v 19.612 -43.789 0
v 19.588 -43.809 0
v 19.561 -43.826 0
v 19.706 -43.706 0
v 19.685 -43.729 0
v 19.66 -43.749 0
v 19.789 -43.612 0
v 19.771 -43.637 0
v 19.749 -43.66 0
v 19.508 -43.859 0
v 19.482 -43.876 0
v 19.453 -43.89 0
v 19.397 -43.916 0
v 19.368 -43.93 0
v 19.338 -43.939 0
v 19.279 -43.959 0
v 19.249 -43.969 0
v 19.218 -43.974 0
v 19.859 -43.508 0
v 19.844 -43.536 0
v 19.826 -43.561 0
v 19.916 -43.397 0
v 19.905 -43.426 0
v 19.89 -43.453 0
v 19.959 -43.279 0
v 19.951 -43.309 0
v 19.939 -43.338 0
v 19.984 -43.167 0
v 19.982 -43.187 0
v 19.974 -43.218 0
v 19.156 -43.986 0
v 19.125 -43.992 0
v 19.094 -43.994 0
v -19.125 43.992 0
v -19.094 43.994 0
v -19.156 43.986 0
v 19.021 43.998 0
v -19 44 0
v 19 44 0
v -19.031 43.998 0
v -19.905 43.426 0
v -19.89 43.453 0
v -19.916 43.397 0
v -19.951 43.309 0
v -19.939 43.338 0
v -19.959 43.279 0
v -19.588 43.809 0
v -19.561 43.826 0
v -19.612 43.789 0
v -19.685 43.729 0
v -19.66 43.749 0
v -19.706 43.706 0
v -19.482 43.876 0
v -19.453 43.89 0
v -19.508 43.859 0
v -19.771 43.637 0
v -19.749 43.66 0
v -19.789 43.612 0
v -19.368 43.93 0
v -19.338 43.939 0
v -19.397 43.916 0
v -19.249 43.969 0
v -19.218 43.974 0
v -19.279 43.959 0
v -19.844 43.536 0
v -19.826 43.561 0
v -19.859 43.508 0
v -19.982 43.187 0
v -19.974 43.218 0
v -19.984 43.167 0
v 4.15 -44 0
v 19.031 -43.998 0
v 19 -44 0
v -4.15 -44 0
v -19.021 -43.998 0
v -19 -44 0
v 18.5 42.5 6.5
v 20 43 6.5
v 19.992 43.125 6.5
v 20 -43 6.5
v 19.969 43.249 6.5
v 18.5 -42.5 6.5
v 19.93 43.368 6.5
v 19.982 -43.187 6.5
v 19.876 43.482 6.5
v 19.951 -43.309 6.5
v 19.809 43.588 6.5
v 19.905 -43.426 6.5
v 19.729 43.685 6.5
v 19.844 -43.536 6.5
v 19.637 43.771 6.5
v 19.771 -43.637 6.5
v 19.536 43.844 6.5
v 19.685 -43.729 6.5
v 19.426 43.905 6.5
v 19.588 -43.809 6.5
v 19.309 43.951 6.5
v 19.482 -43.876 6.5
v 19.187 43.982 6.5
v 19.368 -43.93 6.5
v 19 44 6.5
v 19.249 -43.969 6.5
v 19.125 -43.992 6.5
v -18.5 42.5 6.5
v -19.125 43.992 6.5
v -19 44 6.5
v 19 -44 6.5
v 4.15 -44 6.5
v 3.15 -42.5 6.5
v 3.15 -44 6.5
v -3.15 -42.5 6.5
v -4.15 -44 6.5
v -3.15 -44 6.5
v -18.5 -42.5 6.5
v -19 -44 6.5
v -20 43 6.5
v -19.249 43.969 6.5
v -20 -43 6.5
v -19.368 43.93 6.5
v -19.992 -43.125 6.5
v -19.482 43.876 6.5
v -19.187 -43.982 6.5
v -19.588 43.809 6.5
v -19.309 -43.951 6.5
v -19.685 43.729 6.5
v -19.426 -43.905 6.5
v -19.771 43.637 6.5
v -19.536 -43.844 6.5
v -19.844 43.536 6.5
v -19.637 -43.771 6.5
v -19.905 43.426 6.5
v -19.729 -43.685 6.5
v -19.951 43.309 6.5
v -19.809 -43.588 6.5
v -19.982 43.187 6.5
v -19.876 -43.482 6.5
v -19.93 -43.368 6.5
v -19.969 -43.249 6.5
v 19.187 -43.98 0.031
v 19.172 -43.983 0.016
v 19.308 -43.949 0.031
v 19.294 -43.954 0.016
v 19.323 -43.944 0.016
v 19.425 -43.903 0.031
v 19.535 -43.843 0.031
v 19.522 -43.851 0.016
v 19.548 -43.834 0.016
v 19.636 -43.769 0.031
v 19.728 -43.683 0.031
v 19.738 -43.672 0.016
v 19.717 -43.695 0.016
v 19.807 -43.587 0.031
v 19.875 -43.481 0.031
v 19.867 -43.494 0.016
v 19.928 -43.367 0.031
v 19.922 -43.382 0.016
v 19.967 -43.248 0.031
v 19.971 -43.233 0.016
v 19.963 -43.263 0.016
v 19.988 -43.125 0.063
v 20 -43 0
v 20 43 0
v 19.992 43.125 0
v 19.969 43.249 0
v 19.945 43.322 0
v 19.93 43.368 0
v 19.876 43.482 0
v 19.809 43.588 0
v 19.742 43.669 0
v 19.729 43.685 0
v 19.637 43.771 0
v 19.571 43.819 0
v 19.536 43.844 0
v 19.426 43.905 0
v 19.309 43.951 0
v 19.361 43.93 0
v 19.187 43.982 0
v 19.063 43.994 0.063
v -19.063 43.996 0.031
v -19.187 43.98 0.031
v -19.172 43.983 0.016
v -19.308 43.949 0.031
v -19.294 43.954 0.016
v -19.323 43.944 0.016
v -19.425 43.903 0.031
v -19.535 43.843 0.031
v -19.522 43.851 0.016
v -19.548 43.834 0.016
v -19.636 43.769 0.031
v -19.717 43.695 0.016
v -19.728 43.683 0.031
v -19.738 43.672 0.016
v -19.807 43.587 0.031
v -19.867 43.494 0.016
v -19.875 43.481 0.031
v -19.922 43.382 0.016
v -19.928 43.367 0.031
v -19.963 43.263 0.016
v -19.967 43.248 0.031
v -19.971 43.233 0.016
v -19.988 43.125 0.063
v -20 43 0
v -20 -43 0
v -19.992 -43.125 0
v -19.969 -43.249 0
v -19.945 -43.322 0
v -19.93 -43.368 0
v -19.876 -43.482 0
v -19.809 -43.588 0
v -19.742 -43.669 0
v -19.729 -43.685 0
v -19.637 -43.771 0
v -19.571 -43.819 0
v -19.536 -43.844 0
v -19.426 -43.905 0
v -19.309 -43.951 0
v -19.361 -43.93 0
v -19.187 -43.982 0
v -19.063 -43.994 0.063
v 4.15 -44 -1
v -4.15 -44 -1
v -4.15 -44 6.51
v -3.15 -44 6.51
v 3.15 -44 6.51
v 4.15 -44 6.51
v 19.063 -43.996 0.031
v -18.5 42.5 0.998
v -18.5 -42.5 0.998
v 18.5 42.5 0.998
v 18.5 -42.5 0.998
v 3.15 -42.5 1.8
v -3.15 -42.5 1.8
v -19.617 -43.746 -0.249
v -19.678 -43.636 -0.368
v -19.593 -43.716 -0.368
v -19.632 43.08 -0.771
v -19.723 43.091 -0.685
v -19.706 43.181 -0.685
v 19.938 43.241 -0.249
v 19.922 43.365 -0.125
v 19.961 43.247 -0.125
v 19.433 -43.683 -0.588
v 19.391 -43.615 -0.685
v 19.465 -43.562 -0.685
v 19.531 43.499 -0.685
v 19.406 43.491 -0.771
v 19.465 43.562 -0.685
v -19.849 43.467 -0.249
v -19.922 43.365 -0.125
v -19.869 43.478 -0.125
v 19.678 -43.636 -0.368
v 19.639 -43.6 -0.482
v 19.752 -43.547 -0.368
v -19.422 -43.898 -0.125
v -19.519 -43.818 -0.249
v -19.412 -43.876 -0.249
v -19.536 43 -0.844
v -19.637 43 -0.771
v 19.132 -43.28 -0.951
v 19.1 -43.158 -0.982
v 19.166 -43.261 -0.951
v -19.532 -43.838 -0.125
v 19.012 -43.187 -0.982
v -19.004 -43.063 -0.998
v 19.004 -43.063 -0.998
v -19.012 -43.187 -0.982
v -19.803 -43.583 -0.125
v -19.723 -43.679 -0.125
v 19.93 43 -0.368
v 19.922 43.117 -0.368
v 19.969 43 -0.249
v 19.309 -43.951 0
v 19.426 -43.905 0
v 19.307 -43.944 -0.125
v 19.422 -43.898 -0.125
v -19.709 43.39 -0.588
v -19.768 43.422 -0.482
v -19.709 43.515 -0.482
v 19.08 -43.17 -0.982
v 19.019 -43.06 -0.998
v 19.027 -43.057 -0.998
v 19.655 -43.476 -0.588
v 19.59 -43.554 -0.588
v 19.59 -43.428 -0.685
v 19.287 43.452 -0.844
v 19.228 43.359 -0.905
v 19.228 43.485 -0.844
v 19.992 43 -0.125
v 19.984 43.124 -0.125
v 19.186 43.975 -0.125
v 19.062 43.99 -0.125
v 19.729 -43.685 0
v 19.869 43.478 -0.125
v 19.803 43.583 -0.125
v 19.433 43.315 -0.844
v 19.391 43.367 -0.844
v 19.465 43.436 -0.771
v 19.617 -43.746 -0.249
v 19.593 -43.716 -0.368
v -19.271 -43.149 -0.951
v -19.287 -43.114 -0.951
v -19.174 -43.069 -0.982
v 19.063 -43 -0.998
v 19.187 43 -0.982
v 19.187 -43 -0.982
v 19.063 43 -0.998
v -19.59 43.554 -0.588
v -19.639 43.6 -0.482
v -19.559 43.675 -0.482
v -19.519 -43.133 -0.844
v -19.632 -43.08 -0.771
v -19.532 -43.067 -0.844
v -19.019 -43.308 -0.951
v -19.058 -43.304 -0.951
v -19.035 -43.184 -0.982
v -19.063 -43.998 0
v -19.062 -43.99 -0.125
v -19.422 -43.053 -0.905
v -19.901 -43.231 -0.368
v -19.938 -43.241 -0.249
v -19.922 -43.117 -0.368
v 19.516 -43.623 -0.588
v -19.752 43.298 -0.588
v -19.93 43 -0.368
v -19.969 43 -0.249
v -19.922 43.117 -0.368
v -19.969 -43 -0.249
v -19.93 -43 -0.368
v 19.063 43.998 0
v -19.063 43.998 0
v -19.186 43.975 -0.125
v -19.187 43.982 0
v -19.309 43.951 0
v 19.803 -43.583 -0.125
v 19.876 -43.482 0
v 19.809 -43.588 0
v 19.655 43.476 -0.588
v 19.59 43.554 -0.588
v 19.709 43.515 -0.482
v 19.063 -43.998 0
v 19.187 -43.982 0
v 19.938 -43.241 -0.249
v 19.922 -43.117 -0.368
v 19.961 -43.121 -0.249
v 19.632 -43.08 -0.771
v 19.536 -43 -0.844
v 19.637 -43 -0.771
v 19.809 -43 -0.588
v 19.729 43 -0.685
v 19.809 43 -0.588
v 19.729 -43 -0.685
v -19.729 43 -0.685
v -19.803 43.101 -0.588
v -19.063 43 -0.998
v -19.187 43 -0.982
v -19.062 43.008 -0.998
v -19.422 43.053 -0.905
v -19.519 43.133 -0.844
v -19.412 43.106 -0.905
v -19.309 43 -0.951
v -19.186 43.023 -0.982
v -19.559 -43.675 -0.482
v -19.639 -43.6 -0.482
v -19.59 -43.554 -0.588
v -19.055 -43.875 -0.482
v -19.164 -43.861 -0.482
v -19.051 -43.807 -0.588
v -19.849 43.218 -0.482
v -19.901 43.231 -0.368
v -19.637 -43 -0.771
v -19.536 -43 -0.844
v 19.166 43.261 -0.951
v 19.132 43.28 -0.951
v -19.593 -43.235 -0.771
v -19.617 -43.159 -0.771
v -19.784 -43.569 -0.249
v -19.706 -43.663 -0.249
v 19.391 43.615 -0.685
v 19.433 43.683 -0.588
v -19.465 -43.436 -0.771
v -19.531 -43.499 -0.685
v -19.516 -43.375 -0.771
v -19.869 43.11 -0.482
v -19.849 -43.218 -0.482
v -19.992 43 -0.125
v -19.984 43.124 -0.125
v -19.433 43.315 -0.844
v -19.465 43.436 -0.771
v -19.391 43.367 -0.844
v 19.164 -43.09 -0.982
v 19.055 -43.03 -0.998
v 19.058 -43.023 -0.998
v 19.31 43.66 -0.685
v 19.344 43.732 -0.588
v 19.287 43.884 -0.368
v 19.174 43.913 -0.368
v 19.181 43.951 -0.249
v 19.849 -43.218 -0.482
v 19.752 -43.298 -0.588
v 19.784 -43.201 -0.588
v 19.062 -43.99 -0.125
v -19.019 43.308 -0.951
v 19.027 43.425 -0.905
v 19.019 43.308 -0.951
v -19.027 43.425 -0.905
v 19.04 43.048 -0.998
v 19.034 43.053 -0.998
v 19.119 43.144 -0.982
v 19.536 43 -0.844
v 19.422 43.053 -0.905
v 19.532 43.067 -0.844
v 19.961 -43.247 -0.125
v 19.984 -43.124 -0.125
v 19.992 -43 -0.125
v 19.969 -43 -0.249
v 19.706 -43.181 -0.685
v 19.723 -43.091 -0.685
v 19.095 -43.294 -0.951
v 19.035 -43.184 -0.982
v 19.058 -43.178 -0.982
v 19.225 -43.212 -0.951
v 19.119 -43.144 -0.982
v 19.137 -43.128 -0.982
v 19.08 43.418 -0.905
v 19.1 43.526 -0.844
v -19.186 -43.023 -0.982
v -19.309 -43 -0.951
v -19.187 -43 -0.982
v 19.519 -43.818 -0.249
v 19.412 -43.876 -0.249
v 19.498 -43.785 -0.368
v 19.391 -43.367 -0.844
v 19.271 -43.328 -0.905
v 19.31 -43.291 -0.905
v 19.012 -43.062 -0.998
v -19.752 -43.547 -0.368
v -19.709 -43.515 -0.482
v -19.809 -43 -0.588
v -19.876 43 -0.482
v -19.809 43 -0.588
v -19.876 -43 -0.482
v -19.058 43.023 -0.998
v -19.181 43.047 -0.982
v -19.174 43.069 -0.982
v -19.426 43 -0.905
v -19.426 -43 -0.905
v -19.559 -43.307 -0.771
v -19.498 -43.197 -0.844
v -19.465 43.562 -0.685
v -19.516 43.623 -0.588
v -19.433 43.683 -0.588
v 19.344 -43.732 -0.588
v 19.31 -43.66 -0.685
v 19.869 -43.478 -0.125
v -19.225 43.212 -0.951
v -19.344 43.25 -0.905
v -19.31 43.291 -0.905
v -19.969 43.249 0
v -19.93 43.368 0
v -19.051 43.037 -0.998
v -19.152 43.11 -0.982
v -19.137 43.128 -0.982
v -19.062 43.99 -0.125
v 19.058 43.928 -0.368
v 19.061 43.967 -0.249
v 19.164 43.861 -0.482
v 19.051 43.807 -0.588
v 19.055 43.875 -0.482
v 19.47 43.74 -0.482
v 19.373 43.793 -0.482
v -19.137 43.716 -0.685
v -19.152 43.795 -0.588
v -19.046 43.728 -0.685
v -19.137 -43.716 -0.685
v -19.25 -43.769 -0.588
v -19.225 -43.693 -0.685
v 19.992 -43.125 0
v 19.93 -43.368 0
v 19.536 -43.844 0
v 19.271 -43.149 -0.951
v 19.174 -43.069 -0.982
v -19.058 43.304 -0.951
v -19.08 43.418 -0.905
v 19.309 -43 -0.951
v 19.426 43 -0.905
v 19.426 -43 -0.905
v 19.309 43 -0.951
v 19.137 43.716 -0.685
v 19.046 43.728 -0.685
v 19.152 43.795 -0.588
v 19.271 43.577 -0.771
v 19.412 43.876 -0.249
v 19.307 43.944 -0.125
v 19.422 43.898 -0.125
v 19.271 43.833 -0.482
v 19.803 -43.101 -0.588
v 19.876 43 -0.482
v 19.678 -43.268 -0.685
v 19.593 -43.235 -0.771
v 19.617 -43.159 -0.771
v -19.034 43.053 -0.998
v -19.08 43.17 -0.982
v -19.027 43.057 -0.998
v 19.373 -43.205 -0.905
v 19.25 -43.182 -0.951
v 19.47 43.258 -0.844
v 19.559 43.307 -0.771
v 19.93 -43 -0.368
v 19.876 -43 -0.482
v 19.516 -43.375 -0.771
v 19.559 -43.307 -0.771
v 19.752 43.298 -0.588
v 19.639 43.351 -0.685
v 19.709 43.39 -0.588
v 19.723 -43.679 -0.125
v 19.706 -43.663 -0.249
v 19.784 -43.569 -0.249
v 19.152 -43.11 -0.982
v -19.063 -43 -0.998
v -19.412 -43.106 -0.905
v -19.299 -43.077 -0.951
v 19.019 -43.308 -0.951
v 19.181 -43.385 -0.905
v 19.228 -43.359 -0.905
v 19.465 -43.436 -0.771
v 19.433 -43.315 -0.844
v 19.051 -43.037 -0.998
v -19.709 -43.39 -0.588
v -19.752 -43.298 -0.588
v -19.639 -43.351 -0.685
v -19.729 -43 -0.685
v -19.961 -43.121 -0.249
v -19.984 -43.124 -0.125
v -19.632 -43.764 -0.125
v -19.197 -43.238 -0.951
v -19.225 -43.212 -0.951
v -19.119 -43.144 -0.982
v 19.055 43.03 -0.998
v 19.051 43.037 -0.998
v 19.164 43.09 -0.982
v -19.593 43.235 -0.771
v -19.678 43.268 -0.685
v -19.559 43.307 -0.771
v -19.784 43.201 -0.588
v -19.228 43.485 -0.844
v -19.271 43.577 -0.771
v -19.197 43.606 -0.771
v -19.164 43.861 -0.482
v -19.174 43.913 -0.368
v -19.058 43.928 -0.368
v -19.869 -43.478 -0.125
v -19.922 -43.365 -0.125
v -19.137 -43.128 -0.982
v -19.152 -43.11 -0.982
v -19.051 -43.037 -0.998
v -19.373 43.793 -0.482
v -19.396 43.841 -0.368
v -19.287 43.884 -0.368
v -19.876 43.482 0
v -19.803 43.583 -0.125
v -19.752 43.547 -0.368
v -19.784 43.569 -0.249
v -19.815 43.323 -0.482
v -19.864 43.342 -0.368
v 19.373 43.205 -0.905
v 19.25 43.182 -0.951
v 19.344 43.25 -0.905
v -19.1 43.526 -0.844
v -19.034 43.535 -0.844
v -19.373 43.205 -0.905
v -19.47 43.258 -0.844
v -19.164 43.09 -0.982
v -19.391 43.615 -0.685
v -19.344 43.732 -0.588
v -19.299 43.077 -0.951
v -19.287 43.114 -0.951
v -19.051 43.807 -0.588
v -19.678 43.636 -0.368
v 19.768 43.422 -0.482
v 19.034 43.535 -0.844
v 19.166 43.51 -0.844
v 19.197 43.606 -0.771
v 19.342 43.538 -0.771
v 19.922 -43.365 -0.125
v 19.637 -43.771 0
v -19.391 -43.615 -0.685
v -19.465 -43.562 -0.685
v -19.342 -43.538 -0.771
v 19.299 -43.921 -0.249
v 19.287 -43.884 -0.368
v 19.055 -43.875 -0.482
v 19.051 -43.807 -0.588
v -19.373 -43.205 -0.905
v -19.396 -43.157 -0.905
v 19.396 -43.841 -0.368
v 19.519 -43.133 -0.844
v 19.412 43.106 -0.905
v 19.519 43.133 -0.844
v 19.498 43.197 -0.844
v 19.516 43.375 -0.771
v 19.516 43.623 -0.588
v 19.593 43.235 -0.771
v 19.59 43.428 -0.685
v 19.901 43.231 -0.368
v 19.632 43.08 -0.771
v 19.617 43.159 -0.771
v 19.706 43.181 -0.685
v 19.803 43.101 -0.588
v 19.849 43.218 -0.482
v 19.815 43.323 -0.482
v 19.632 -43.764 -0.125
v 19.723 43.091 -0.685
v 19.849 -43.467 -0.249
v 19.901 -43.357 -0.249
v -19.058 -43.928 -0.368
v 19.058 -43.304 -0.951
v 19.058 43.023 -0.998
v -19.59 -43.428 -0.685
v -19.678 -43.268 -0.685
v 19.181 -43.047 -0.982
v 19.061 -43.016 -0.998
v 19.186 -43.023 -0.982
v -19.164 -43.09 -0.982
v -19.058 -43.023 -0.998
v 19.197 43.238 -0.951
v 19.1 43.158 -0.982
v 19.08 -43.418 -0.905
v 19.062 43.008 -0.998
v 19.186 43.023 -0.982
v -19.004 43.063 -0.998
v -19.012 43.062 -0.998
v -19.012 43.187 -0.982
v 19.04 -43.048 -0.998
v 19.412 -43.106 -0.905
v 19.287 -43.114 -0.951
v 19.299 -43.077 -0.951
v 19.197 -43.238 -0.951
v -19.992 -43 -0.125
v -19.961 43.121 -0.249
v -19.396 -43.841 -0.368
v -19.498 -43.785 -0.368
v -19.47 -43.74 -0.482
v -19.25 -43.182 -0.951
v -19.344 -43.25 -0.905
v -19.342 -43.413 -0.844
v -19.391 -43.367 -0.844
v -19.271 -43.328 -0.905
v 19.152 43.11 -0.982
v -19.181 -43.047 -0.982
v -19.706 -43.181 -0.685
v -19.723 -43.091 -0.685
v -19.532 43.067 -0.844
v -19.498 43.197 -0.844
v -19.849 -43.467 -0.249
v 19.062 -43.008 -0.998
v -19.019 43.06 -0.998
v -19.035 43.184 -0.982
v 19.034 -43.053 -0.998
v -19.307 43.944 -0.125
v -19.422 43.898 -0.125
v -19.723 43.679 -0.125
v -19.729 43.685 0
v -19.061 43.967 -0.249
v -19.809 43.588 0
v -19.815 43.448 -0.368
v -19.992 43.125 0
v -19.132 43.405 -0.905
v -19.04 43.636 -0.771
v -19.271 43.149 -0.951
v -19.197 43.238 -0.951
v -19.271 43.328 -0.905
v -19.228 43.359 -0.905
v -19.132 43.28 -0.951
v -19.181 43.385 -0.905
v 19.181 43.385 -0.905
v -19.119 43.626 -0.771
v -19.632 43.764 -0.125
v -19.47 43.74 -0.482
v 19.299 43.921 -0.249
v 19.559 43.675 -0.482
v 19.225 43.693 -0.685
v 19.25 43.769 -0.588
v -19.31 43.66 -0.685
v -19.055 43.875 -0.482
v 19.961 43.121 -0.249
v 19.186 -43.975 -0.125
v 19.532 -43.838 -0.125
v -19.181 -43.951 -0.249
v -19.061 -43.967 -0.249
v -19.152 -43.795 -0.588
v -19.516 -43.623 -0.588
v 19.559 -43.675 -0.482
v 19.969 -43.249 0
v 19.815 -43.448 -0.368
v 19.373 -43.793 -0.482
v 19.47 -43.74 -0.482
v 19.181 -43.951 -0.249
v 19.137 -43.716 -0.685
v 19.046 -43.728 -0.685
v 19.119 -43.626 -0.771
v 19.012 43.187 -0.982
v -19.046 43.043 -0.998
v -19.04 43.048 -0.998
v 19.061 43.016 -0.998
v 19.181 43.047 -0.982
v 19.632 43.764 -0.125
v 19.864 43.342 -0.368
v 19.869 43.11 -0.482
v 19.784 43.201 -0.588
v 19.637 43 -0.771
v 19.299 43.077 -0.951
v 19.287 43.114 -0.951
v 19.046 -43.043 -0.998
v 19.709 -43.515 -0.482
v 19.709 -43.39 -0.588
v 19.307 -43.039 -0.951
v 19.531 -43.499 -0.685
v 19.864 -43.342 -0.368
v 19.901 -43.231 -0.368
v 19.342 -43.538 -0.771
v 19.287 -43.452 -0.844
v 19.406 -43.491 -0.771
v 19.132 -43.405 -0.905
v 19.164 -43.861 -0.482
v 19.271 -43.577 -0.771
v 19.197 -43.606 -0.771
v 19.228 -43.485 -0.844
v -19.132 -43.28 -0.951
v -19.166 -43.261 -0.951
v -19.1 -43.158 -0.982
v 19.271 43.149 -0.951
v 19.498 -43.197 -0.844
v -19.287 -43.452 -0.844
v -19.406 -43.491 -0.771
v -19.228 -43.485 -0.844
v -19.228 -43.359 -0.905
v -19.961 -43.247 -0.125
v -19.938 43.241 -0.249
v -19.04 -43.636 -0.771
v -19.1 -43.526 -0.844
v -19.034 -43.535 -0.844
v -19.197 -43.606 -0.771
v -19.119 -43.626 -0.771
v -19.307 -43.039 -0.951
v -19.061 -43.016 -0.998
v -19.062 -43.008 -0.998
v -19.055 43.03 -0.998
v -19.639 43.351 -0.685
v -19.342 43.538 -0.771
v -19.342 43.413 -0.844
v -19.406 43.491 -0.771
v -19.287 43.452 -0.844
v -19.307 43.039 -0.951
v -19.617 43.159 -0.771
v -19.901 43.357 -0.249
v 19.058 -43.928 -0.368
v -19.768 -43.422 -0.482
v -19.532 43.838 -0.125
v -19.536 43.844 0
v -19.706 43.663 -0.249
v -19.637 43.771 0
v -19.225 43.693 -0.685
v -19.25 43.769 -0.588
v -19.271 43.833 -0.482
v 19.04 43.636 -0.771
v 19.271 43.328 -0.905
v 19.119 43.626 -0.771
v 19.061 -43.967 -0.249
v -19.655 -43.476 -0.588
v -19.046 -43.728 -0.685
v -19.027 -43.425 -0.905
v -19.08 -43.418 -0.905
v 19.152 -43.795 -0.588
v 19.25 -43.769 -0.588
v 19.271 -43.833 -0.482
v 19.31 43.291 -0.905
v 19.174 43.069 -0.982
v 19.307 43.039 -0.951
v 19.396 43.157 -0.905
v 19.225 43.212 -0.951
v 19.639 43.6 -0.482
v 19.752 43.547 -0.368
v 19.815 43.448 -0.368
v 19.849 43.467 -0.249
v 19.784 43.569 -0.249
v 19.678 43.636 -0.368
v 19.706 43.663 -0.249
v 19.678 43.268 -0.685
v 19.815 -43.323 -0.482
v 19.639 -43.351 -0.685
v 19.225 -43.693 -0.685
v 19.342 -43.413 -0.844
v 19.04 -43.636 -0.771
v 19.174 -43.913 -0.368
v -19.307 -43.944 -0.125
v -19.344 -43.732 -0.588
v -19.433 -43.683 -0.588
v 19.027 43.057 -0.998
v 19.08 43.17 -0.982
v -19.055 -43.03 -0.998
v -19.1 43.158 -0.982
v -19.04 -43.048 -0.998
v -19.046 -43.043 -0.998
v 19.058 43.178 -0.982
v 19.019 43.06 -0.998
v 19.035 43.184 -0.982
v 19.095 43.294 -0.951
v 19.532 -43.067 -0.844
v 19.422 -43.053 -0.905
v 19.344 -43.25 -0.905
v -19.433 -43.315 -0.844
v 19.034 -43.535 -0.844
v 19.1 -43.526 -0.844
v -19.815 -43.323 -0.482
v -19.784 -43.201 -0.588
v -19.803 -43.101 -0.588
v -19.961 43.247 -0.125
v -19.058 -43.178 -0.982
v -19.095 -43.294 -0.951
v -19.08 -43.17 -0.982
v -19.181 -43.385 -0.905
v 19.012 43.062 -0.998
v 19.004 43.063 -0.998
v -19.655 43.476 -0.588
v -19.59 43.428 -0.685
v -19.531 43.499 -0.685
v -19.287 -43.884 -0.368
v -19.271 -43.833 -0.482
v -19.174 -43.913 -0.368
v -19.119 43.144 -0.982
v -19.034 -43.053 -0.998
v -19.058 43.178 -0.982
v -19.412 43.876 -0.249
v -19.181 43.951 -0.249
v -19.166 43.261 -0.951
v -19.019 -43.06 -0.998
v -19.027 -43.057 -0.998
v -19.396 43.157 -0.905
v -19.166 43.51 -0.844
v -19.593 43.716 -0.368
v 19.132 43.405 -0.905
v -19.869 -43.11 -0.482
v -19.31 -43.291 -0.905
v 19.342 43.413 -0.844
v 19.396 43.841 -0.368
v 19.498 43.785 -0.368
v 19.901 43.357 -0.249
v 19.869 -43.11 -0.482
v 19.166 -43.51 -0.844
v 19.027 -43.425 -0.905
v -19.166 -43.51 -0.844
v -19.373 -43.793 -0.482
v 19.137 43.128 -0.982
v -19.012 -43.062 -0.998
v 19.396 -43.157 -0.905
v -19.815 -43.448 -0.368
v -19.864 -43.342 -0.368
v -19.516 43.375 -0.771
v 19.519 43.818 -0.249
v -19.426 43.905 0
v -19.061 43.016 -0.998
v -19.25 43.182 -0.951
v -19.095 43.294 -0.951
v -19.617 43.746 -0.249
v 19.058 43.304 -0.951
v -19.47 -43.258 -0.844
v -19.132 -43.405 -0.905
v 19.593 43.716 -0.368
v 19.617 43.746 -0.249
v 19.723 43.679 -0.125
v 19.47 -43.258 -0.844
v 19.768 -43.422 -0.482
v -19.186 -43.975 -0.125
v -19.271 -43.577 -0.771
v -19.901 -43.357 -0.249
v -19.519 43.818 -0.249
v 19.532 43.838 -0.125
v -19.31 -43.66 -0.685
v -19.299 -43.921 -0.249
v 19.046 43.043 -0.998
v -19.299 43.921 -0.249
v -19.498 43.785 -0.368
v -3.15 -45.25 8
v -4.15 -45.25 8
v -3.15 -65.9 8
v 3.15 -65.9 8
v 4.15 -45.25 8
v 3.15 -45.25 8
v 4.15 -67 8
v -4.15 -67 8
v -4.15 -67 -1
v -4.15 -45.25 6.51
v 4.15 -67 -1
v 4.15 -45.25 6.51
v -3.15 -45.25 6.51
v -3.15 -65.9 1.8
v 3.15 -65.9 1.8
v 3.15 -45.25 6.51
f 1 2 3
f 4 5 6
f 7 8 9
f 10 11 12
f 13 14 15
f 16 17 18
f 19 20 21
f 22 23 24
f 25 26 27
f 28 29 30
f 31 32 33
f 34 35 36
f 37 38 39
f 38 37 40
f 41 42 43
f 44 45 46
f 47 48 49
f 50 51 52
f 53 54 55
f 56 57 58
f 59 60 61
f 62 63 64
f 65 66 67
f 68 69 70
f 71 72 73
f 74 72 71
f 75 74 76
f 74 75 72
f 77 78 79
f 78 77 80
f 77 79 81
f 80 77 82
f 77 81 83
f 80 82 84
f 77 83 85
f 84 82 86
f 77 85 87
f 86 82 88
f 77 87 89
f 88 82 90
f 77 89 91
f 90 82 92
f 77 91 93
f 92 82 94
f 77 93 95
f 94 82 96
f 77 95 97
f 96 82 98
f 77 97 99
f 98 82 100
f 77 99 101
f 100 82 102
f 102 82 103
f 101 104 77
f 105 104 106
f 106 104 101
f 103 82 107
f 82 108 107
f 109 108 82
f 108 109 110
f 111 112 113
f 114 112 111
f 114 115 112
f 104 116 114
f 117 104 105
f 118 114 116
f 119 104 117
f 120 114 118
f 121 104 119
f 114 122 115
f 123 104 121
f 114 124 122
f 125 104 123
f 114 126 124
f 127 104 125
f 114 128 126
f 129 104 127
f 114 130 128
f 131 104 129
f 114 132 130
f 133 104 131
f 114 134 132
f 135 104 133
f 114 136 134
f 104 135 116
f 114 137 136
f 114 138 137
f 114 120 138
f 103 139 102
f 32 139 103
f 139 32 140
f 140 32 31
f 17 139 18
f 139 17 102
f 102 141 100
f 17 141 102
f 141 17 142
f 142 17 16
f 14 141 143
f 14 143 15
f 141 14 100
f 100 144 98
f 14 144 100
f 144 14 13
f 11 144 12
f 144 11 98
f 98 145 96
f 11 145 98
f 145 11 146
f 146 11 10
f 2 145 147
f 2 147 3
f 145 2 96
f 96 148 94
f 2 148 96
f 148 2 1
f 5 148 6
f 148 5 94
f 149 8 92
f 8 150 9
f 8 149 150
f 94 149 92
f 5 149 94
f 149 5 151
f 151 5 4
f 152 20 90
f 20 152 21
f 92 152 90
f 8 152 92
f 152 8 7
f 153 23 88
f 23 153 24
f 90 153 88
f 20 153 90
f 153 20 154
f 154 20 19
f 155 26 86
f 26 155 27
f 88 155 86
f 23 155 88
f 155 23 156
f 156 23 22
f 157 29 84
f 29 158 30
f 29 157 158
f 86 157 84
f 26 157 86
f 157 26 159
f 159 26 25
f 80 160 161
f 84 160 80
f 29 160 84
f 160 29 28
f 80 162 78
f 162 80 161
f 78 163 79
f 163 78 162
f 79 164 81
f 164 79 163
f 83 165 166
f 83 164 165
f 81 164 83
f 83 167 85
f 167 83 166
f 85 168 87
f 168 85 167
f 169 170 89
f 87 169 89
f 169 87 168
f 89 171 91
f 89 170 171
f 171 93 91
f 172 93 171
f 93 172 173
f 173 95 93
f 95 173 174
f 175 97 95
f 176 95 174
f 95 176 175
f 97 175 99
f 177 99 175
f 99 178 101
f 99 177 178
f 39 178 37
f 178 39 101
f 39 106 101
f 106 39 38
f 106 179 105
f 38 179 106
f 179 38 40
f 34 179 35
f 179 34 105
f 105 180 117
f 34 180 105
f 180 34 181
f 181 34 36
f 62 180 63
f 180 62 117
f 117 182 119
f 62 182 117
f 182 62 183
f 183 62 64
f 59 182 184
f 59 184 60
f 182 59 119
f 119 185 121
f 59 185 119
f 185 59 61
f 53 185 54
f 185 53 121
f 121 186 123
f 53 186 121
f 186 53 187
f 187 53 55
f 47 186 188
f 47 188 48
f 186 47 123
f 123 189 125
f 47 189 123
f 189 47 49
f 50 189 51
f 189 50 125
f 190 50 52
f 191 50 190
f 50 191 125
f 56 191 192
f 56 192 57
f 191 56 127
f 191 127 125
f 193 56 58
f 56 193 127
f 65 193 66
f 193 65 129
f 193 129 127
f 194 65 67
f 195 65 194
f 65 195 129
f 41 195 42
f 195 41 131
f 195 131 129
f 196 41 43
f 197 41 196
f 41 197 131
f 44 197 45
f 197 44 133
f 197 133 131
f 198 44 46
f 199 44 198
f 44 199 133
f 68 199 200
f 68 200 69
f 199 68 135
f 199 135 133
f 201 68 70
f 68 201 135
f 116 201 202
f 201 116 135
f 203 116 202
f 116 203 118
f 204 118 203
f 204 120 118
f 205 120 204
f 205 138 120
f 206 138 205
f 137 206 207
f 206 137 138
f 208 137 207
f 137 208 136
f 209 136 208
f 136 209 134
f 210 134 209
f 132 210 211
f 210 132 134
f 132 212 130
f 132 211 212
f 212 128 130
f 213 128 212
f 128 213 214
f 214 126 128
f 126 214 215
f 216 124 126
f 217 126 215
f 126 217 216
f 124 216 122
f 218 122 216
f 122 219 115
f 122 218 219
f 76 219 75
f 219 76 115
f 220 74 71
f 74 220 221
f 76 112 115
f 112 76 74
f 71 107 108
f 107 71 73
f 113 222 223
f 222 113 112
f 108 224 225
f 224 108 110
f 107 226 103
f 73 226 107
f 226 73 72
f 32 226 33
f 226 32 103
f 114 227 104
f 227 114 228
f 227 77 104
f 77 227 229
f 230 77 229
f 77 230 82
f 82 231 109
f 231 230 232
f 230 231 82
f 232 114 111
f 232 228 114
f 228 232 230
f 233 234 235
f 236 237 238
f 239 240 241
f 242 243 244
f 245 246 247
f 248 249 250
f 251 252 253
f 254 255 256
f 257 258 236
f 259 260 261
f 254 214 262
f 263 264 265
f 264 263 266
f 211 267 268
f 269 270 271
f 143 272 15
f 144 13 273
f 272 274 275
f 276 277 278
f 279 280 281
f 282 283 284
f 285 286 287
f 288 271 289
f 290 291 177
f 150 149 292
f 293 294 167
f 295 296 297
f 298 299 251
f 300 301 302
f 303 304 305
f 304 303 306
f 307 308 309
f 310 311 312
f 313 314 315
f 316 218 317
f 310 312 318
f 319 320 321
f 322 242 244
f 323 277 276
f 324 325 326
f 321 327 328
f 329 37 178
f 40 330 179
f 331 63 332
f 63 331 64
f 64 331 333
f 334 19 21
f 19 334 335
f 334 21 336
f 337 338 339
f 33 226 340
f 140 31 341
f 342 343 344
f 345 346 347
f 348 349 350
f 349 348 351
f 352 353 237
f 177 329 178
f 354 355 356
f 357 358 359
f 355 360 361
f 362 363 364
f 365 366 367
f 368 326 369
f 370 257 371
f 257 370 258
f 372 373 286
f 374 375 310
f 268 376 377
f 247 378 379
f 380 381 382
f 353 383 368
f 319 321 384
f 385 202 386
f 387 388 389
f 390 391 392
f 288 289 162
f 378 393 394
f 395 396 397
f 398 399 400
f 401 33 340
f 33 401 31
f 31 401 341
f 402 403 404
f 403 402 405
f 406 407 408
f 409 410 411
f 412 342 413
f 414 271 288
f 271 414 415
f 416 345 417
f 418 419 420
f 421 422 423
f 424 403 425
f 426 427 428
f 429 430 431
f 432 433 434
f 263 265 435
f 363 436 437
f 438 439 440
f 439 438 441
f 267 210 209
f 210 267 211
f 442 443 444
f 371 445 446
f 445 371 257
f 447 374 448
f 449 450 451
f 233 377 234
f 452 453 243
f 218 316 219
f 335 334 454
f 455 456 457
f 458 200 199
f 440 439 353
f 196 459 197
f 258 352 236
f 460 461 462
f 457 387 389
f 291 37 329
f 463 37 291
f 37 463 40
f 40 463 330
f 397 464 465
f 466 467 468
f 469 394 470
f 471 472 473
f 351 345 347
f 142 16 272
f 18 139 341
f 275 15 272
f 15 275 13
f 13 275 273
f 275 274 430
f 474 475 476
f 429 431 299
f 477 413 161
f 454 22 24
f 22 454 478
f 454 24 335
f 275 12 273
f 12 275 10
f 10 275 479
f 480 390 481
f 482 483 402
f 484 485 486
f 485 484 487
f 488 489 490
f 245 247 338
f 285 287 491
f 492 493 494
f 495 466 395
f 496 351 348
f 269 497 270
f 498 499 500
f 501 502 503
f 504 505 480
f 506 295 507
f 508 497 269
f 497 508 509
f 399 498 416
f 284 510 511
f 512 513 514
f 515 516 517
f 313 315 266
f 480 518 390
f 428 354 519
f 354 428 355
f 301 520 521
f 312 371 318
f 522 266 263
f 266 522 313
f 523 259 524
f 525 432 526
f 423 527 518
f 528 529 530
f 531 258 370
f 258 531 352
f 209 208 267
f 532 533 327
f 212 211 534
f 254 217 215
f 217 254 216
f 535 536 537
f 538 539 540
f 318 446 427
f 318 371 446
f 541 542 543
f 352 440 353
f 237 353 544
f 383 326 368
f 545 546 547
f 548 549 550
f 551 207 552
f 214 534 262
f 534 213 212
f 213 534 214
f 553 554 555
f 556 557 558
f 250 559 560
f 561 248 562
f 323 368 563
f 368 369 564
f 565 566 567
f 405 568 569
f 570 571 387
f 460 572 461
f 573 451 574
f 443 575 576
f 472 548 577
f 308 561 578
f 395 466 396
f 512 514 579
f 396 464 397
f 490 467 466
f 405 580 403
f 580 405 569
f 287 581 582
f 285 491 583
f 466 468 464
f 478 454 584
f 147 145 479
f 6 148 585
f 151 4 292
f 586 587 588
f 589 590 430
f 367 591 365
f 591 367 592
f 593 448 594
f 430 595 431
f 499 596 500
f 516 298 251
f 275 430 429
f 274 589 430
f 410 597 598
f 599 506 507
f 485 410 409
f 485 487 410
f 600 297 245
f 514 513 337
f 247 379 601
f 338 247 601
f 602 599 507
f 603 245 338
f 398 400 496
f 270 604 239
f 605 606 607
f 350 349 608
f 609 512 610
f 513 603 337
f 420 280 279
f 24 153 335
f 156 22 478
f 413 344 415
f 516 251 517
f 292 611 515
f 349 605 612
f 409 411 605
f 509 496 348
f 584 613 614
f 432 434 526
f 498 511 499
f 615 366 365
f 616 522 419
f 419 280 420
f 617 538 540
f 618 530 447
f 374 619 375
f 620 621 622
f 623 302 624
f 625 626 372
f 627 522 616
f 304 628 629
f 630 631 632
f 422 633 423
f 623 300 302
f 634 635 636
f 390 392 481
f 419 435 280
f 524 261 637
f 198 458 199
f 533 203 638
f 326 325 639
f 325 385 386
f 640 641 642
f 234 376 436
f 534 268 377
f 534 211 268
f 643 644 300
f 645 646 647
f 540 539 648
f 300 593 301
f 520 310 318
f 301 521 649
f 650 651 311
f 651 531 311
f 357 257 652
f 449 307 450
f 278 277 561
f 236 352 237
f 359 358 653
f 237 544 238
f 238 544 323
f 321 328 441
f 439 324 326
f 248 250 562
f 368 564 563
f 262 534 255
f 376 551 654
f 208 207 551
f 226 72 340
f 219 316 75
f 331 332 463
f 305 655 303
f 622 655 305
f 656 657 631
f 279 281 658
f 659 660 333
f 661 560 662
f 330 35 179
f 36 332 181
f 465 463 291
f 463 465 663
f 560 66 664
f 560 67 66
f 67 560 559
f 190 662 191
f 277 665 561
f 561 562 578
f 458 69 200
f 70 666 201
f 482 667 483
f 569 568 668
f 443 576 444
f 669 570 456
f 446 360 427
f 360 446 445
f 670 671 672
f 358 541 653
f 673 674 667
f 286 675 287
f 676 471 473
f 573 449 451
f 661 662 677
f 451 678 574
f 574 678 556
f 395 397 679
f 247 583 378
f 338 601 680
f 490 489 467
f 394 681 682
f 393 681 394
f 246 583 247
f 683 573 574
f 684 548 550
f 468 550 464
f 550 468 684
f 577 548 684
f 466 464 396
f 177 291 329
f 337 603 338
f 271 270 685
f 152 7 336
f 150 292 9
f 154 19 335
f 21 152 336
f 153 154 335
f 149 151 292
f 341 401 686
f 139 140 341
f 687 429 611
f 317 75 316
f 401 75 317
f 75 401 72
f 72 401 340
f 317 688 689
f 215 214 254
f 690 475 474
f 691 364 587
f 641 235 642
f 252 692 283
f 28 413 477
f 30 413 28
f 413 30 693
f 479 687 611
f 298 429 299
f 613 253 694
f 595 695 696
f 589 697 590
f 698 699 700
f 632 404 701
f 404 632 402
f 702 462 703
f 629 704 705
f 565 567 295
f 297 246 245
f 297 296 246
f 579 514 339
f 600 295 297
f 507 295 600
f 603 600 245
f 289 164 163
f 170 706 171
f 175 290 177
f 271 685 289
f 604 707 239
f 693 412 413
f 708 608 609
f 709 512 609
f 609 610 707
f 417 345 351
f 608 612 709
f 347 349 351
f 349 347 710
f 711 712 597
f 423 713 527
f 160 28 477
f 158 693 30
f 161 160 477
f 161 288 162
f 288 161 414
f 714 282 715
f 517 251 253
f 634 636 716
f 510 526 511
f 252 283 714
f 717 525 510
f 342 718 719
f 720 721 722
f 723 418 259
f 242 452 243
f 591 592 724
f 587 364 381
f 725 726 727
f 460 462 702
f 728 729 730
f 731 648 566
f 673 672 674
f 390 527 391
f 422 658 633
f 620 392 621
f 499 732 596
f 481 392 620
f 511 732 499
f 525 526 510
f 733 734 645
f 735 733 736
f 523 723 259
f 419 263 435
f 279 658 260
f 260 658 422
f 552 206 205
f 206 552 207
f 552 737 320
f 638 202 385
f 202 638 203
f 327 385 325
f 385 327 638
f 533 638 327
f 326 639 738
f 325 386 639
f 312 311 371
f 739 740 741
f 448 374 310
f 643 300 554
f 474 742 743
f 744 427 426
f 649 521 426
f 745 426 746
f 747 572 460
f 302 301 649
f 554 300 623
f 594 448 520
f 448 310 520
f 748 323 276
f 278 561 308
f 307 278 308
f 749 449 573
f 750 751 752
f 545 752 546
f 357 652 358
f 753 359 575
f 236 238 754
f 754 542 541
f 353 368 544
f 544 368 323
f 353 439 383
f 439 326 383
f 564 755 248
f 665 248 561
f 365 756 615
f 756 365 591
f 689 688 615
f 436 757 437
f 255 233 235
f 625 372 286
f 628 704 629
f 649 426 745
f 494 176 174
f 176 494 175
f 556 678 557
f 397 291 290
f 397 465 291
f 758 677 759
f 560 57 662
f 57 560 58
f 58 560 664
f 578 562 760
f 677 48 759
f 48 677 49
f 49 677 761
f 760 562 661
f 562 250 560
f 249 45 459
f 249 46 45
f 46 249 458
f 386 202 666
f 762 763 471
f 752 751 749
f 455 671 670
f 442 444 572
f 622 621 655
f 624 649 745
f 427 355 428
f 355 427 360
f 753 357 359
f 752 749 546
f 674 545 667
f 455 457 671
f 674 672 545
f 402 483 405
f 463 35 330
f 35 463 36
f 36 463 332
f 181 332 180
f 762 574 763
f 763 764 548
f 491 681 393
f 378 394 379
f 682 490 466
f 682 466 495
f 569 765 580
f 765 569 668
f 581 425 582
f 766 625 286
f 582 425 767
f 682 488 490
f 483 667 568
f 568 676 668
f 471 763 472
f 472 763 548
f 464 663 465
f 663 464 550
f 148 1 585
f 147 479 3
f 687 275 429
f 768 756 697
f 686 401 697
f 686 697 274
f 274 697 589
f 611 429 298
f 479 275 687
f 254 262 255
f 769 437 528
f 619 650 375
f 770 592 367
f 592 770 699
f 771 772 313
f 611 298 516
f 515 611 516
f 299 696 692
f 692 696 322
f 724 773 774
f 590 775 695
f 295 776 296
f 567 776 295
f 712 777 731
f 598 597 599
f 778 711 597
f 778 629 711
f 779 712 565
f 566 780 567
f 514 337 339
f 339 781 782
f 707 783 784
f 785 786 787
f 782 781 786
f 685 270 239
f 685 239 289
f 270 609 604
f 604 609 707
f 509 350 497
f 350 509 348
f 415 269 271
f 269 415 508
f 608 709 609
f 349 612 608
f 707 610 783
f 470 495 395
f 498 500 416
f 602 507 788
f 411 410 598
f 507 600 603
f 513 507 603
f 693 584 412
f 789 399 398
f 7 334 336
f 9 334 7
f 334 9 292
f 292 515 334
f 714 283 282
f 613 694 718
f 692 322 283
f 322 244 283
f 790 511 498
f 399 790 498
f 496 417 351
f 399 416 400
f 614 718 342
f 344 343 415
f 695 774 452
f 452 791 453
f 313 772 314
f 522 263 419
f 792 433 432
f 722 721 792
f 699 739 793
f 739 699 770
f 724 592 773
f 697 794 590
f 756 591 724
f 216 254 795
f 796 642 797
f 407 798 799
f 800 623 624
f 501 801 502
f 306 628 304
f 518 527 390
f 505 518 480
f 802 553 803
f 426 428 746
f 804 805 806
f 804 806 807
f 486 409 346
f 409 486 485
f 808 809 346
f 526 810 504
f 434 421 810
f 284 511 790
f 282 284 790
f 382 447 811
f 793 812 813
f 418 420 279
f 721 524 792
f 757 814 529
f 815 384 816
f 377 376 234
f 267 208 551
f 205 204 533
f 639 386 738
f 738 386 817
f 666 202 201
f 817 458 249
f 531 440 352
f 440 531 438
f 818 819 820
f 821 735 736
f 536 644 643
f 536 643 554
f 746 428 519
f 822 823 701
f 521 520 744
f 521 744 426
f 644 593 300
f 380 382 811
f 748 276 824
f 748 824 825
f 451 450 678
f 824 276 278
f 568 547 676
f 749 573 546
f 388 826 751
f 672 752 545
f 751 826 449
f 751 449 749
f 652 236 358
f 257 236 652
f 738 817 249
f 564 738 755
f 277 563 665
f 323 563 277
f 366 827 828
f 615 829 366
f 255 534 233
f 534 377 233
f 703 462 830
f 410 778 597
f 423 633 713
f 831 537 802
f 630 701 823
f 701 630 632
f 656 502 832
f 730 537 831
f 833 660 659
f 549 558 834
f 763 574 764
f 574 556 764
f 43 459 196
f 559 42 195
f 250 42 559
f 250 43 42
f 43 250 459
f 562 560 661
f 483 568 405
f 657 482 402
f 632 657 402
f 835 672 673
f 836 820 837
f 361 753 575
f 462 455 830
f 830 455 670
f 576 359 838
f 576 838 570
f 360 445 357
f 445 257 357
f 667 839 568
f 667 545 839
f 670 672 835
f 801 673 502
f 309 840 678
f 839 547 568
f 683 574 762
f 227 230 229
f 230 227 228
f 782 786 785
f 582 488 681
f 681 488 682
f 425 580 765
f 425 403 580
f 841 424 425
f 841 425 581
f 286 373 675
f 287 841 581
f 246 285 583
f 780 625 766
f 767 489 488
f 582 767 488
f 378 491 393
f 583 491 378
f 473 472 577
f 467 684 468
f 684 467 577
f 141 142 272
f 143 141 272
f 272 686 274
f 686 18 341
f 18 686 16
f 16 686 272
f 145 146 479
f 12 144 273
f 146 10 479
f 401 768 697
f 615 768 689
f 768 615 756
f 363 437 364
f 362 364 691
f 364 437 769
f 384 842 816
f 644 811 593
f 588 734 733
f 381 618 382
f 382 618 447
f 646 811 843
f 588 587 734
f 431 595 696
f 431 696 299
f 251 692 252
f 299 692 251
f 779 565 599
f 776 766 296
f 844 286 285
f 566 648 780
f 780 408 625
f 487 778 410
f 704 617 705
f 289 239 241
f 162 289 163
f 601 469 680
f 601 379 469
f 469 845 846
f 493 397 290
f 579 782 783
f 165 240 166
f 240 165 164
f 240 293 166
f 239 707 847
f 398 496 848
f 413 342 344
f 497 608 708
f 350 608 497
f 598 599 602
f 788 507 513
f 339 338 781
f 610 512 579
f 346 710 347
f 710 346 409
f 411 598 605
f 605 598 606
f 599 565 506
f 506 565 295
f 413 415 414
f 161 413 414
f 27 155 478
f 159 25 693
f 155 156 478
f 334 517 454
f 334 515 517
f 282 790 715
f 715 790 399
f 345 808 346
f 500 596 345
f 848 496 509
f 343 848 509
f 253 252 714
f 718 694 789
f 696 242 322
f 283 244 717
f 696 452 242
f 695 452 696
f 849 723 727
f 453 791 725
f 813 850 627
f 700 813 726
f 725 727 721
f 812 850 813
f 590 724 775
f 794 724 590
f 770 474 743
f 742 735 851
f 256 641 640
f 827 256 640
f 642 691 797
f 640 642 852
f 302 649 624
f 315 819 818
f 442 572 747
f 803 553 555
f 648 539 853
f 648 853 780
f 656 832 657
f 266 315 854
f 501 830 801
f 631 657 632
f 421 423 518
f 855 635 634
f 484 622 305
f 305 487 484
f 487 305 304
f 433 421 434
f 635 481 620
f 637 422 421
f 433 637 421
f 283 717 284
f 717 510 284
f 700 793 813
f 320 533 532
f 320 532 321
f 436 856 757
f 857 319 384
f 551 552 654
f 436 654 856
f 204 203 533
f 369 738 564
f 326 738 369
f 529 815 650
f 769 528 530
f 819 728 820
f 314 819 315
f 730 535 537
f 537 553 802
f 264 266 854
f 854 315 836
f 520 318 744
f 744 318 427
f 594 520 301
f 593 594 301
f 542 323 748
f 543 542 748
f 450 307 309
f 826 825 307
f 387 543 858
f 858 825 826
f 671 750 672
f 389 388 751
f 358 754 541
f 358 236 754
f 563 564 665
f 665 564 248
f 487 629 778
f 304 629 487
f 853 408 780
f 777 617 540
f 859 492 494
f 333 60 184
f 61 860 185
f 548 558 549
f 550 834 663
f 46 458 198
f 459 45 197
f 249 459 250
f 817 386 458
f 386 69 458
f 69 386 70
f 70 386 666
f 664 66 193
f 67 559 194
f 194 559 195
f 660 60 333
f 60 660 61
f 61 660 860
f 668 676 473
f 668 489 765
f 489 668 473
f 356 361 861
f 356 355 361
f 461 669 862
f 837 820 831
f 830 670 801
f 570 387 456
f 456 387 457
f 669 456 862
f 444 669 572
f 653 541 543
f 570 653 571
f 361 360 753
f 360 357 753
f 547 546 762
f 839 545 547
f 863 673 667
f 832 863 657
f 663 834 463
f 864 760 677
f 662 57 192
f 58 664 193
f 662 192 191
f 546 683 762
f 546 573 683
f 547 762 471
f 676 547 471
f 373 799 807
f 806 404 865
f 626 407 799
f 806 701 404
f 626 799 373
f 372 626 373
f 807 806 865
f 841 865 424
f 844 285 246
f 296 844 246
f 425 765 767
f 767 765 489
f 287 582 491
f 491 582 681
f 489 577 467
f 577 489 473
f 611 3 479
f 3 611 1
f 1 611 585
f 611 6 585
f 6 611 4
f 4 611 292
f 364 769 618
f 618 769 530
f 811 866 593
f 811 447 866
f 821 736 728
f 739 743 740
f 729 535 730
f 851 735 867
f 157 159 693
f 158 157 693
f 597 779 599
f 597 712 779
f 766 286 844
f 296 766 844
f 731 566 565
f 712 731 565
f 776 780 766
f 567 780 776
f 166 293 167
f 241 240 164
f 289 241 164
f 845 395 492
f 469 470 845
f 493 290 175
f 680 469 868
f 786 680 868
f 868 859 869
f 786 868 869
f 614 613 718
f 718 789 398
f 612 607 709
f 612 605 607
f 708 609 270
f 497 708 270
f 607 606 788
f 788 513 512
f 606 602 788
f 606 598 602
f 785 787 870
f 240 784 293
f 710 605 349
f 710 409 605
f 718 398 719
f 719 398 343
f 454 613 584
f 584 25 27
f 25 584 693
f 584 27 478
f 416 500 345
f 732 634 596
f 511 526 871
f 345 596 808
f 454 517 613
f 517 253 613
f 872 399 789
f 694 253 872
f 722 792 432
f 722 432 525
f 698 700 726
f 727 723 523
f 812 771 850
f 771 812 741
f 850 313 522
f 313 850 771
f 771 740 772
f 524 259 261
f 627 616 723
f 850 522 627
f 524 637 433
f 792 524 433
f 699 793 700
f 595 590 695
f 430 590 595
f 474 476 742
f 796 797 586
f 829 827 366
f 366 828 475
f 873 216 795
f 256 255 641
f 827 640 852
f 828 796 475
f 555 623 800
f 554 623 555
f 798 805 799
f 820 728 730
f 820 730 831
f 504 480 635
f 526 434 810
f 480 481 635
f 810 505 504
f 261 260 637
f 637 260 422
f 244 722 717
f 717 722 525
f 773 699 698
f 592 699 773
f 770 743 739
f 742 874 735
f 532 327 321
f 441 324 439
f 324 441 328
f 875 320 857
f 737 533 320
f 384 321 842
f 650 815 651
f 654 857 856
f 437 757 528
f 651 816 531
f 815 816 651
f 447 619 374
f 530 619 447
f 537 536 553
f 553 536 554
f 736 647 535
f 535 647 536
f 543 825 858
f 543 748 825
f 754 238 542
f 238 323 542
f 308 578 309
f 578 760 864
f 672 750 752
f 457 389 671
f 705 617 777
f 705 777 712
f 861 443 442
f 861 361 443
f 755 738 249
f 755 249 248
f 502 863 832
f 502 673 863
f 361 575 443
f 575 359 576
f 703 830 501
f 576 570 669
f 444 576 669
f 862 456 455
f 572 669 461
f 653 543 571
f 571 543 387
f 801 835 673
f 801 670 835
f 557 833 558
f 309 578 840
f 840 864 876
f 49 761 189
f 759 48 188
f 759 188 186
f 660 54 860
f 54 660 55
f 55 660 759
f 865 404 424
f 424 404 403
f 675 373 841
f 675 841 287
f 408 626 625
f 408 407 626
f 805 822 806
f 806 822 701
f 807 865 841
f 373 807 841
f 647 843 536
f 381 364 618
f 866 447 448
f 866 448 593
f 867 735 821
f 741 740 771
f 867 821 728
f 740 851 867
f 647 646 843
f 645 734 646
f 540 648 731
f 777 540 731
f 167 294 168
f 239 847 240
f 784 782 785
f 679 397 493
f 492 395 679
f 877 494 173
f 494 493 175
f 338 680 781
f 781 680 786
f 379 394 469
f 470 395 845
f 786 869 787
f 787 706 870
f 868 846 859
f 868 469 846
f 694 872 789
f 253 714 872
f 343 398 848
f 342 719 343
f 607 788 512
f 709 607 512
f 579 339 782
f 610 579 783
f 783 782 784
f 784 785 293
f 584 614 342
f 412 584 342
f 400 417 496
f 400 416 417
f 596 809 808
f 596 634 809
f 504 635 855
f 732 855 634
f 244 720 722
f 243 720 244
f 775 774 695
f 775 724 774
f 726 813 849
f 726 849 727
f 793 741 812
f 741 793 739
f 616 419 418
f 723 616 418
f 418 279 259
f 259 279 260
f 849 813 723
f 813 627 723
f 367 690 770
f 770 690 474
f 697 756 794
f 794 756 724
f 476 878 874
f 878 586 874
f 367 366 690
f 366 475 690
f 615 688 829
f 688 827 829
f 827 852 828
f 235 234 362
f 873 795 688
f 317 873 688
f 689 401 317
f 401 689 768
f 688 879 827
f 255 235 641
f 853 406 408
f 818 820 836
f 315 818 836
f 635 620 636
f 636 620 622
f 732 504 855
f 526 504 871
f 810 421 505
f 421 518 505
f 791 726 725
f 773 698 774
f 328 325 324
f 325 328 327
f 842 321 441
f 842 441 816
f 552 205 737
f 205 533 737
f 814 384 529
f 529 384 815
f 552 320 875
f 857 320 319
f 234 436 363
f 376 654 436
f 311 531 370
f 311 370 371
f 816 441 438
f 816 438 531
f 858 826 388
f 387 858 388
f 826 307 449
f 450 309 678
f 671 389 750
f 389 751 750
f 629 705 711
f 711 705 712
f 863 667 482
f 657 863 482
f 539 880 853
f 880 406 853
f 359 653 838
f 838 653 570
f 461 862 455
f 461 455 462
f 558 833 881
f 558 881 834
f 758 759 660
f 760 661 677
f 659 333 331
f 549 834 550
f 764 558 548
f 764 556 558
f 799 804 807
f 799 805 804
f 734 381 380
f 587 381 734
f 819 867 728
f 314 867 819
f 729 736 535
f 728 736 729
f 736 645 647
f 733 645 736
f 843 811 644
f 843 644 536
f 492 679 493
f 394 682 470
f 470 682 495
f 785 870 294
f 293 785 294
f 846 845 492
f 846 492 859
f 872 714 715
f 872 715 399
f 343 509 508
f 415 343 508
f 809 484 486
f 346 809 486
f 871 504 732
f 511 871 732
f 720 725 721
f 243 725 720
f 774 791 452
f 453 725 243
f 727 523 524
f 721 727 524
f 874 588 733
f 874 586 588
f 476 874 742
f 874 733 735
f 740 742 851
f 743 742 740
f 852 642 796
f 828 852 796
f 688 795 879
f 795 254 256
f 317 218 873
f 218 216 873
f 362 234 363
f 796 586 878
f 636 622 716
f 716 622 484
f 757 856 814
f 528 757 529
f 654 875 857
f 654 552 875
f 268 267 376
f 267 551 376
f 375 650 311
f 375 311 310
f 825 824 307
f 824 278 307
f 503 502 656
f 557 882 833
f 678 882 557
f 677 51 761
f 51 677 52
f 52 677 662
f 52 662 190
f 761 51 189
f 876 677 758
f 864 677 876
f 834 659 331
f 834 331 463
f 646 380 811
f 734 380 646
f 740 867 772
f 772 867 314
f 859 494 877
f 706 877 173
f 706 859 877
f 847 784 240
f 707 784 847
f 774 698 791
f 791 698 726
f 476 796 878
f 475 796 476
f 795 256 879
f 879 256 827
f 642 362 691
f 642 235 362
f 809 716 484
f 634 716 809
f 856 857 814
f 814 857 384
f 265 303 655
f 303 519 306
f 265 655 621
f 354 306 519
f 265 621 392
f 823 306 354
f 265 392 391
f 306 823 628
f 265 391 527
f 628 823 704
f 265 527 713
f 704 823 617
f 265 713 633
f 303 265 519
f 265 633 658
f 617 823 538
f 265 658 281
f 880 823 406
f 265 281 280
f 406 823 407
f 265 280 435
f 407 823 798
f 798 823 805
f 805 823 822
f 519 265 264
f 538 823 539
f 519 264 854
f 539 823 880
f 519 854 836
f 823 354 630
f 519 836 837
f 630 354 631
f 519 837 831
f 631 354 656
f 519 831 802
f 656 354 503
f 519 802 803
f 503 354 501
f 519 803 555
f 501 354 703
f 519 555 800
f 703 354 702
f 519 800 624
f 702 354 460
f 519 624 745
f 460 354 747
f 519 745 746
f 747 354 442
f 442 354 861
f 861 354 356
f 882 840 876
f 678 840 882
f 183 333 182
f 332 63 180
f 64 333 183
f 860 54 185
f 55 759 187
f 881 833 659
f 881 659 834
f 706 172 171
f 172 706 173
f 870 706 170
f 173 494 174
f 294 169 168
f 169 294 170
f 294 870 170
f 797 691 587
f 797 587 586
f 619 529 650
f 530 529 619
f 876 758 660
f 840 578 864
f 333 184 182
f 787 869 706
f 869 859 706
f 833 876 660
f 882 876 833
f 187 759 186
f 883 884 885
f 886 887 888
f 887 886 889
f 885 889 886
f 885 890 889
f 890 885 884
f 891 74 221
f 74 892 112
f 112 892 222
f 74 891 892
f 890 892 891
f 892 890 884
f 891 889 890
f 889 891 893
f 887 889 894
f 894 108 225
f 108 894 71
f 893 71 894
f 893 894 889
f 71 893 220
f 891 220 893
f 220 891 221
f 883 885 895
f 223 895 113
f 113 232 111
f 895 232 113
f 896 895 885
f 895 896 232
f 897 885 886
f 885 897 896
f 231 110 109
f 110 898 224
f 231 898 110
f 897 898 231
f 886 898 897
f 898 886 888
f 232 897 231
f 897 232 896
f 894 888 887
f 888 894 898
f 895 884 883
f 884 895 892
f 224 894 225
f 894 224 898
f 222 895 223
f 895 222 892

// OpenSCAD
$fn=50;
BOX_W = 38; // Box Width
BOX_L = 86;// Box Length
BOX_H = 6.5; // Box Height
CORNER_RADIUS = 1.0; // Radius of corners
WALL = 1.0;// Wall Thickness

MIC_OUTSIDE_WIDTH=8.3;
MIC_OUTSIDE_HEIGHT=9.0;
MIC_INSIDE_WIDTH=6.3;
MIC_LENGTH=23;

CON_OUTSIDE=5;
CON_INSIDE=4;
CON_LENGTH=3;

MIC_OFFSET_X = 0;
MIC_OFFSET_Y = -26.0;
MIC_OFFSET_Z = 0;



difference() {
    union() {
        linear_extrude( BOX_H )
        difference(){
            offset(r=CORNER_RADIUS) square( [BOX_W, BOX_L], center=true );
            offset(r= CORNER_RADIUS - WALL) square([BOX_W-WALL, BOX_L-WALL], center=true );
        };

        coordinates = [ [0,0],[0,BOX_L],[BOX_W,BOX_L],[BOX_W,0] ];

        translate ( [-BOX_W/2, -BOX_L/2] )
            hull()
            for (i = coordinates)
            translate(i) sphere(CORNER_RADIUS);
        translate([MIC_OFFSET_X, MIC_OFFSET_Y, MIC_OFFSET_Z]){
            // outside shape
            translate([0,-18.0,BOX_H-3])
            rotate([90,0,0])
            #linear_extrude(MIC_LENGTH) square([MIC_OUTSIDE_WIDTH,MIC_OUTSIDE_HEIGHT], center=true);
        }
    }
    translate([MIC_OFFSET_X, MIC_OFFSET_Y, MIC_OFFSET_Z]){
        // inside mio channel
        translate([0,-13.8,BOX_H-0.2]) // inside
        rotate([90,0,0])
        linear_extrude(MIC_LENGTH+3.1) square([MIC_INSIDE_WIDTH,MIC_OUTSIDE_HEIGHT], center=true); 
        
        // mic lid clearance
        translate([0,-17.25,BOX_H+1.11])
        rotate([90,0,0])
        linear_extrude(2.0) square([9,2.2], center=true);   
        
        // mic lid clearance
        translate([0,-17.25,BOX_H+1.11])
        rotate([90,0,0])
        linear_extrude(2.0) square([9,2.2], center=true);
    }

    translate([0,19.3,BOX_H-1])
    rotate([90,0,0])
    //cylinder(h=CON_LENGTH+1,r=CON_INSIDE/2);
    linear_extrude(2.0) square([6,3], center=true);
}
